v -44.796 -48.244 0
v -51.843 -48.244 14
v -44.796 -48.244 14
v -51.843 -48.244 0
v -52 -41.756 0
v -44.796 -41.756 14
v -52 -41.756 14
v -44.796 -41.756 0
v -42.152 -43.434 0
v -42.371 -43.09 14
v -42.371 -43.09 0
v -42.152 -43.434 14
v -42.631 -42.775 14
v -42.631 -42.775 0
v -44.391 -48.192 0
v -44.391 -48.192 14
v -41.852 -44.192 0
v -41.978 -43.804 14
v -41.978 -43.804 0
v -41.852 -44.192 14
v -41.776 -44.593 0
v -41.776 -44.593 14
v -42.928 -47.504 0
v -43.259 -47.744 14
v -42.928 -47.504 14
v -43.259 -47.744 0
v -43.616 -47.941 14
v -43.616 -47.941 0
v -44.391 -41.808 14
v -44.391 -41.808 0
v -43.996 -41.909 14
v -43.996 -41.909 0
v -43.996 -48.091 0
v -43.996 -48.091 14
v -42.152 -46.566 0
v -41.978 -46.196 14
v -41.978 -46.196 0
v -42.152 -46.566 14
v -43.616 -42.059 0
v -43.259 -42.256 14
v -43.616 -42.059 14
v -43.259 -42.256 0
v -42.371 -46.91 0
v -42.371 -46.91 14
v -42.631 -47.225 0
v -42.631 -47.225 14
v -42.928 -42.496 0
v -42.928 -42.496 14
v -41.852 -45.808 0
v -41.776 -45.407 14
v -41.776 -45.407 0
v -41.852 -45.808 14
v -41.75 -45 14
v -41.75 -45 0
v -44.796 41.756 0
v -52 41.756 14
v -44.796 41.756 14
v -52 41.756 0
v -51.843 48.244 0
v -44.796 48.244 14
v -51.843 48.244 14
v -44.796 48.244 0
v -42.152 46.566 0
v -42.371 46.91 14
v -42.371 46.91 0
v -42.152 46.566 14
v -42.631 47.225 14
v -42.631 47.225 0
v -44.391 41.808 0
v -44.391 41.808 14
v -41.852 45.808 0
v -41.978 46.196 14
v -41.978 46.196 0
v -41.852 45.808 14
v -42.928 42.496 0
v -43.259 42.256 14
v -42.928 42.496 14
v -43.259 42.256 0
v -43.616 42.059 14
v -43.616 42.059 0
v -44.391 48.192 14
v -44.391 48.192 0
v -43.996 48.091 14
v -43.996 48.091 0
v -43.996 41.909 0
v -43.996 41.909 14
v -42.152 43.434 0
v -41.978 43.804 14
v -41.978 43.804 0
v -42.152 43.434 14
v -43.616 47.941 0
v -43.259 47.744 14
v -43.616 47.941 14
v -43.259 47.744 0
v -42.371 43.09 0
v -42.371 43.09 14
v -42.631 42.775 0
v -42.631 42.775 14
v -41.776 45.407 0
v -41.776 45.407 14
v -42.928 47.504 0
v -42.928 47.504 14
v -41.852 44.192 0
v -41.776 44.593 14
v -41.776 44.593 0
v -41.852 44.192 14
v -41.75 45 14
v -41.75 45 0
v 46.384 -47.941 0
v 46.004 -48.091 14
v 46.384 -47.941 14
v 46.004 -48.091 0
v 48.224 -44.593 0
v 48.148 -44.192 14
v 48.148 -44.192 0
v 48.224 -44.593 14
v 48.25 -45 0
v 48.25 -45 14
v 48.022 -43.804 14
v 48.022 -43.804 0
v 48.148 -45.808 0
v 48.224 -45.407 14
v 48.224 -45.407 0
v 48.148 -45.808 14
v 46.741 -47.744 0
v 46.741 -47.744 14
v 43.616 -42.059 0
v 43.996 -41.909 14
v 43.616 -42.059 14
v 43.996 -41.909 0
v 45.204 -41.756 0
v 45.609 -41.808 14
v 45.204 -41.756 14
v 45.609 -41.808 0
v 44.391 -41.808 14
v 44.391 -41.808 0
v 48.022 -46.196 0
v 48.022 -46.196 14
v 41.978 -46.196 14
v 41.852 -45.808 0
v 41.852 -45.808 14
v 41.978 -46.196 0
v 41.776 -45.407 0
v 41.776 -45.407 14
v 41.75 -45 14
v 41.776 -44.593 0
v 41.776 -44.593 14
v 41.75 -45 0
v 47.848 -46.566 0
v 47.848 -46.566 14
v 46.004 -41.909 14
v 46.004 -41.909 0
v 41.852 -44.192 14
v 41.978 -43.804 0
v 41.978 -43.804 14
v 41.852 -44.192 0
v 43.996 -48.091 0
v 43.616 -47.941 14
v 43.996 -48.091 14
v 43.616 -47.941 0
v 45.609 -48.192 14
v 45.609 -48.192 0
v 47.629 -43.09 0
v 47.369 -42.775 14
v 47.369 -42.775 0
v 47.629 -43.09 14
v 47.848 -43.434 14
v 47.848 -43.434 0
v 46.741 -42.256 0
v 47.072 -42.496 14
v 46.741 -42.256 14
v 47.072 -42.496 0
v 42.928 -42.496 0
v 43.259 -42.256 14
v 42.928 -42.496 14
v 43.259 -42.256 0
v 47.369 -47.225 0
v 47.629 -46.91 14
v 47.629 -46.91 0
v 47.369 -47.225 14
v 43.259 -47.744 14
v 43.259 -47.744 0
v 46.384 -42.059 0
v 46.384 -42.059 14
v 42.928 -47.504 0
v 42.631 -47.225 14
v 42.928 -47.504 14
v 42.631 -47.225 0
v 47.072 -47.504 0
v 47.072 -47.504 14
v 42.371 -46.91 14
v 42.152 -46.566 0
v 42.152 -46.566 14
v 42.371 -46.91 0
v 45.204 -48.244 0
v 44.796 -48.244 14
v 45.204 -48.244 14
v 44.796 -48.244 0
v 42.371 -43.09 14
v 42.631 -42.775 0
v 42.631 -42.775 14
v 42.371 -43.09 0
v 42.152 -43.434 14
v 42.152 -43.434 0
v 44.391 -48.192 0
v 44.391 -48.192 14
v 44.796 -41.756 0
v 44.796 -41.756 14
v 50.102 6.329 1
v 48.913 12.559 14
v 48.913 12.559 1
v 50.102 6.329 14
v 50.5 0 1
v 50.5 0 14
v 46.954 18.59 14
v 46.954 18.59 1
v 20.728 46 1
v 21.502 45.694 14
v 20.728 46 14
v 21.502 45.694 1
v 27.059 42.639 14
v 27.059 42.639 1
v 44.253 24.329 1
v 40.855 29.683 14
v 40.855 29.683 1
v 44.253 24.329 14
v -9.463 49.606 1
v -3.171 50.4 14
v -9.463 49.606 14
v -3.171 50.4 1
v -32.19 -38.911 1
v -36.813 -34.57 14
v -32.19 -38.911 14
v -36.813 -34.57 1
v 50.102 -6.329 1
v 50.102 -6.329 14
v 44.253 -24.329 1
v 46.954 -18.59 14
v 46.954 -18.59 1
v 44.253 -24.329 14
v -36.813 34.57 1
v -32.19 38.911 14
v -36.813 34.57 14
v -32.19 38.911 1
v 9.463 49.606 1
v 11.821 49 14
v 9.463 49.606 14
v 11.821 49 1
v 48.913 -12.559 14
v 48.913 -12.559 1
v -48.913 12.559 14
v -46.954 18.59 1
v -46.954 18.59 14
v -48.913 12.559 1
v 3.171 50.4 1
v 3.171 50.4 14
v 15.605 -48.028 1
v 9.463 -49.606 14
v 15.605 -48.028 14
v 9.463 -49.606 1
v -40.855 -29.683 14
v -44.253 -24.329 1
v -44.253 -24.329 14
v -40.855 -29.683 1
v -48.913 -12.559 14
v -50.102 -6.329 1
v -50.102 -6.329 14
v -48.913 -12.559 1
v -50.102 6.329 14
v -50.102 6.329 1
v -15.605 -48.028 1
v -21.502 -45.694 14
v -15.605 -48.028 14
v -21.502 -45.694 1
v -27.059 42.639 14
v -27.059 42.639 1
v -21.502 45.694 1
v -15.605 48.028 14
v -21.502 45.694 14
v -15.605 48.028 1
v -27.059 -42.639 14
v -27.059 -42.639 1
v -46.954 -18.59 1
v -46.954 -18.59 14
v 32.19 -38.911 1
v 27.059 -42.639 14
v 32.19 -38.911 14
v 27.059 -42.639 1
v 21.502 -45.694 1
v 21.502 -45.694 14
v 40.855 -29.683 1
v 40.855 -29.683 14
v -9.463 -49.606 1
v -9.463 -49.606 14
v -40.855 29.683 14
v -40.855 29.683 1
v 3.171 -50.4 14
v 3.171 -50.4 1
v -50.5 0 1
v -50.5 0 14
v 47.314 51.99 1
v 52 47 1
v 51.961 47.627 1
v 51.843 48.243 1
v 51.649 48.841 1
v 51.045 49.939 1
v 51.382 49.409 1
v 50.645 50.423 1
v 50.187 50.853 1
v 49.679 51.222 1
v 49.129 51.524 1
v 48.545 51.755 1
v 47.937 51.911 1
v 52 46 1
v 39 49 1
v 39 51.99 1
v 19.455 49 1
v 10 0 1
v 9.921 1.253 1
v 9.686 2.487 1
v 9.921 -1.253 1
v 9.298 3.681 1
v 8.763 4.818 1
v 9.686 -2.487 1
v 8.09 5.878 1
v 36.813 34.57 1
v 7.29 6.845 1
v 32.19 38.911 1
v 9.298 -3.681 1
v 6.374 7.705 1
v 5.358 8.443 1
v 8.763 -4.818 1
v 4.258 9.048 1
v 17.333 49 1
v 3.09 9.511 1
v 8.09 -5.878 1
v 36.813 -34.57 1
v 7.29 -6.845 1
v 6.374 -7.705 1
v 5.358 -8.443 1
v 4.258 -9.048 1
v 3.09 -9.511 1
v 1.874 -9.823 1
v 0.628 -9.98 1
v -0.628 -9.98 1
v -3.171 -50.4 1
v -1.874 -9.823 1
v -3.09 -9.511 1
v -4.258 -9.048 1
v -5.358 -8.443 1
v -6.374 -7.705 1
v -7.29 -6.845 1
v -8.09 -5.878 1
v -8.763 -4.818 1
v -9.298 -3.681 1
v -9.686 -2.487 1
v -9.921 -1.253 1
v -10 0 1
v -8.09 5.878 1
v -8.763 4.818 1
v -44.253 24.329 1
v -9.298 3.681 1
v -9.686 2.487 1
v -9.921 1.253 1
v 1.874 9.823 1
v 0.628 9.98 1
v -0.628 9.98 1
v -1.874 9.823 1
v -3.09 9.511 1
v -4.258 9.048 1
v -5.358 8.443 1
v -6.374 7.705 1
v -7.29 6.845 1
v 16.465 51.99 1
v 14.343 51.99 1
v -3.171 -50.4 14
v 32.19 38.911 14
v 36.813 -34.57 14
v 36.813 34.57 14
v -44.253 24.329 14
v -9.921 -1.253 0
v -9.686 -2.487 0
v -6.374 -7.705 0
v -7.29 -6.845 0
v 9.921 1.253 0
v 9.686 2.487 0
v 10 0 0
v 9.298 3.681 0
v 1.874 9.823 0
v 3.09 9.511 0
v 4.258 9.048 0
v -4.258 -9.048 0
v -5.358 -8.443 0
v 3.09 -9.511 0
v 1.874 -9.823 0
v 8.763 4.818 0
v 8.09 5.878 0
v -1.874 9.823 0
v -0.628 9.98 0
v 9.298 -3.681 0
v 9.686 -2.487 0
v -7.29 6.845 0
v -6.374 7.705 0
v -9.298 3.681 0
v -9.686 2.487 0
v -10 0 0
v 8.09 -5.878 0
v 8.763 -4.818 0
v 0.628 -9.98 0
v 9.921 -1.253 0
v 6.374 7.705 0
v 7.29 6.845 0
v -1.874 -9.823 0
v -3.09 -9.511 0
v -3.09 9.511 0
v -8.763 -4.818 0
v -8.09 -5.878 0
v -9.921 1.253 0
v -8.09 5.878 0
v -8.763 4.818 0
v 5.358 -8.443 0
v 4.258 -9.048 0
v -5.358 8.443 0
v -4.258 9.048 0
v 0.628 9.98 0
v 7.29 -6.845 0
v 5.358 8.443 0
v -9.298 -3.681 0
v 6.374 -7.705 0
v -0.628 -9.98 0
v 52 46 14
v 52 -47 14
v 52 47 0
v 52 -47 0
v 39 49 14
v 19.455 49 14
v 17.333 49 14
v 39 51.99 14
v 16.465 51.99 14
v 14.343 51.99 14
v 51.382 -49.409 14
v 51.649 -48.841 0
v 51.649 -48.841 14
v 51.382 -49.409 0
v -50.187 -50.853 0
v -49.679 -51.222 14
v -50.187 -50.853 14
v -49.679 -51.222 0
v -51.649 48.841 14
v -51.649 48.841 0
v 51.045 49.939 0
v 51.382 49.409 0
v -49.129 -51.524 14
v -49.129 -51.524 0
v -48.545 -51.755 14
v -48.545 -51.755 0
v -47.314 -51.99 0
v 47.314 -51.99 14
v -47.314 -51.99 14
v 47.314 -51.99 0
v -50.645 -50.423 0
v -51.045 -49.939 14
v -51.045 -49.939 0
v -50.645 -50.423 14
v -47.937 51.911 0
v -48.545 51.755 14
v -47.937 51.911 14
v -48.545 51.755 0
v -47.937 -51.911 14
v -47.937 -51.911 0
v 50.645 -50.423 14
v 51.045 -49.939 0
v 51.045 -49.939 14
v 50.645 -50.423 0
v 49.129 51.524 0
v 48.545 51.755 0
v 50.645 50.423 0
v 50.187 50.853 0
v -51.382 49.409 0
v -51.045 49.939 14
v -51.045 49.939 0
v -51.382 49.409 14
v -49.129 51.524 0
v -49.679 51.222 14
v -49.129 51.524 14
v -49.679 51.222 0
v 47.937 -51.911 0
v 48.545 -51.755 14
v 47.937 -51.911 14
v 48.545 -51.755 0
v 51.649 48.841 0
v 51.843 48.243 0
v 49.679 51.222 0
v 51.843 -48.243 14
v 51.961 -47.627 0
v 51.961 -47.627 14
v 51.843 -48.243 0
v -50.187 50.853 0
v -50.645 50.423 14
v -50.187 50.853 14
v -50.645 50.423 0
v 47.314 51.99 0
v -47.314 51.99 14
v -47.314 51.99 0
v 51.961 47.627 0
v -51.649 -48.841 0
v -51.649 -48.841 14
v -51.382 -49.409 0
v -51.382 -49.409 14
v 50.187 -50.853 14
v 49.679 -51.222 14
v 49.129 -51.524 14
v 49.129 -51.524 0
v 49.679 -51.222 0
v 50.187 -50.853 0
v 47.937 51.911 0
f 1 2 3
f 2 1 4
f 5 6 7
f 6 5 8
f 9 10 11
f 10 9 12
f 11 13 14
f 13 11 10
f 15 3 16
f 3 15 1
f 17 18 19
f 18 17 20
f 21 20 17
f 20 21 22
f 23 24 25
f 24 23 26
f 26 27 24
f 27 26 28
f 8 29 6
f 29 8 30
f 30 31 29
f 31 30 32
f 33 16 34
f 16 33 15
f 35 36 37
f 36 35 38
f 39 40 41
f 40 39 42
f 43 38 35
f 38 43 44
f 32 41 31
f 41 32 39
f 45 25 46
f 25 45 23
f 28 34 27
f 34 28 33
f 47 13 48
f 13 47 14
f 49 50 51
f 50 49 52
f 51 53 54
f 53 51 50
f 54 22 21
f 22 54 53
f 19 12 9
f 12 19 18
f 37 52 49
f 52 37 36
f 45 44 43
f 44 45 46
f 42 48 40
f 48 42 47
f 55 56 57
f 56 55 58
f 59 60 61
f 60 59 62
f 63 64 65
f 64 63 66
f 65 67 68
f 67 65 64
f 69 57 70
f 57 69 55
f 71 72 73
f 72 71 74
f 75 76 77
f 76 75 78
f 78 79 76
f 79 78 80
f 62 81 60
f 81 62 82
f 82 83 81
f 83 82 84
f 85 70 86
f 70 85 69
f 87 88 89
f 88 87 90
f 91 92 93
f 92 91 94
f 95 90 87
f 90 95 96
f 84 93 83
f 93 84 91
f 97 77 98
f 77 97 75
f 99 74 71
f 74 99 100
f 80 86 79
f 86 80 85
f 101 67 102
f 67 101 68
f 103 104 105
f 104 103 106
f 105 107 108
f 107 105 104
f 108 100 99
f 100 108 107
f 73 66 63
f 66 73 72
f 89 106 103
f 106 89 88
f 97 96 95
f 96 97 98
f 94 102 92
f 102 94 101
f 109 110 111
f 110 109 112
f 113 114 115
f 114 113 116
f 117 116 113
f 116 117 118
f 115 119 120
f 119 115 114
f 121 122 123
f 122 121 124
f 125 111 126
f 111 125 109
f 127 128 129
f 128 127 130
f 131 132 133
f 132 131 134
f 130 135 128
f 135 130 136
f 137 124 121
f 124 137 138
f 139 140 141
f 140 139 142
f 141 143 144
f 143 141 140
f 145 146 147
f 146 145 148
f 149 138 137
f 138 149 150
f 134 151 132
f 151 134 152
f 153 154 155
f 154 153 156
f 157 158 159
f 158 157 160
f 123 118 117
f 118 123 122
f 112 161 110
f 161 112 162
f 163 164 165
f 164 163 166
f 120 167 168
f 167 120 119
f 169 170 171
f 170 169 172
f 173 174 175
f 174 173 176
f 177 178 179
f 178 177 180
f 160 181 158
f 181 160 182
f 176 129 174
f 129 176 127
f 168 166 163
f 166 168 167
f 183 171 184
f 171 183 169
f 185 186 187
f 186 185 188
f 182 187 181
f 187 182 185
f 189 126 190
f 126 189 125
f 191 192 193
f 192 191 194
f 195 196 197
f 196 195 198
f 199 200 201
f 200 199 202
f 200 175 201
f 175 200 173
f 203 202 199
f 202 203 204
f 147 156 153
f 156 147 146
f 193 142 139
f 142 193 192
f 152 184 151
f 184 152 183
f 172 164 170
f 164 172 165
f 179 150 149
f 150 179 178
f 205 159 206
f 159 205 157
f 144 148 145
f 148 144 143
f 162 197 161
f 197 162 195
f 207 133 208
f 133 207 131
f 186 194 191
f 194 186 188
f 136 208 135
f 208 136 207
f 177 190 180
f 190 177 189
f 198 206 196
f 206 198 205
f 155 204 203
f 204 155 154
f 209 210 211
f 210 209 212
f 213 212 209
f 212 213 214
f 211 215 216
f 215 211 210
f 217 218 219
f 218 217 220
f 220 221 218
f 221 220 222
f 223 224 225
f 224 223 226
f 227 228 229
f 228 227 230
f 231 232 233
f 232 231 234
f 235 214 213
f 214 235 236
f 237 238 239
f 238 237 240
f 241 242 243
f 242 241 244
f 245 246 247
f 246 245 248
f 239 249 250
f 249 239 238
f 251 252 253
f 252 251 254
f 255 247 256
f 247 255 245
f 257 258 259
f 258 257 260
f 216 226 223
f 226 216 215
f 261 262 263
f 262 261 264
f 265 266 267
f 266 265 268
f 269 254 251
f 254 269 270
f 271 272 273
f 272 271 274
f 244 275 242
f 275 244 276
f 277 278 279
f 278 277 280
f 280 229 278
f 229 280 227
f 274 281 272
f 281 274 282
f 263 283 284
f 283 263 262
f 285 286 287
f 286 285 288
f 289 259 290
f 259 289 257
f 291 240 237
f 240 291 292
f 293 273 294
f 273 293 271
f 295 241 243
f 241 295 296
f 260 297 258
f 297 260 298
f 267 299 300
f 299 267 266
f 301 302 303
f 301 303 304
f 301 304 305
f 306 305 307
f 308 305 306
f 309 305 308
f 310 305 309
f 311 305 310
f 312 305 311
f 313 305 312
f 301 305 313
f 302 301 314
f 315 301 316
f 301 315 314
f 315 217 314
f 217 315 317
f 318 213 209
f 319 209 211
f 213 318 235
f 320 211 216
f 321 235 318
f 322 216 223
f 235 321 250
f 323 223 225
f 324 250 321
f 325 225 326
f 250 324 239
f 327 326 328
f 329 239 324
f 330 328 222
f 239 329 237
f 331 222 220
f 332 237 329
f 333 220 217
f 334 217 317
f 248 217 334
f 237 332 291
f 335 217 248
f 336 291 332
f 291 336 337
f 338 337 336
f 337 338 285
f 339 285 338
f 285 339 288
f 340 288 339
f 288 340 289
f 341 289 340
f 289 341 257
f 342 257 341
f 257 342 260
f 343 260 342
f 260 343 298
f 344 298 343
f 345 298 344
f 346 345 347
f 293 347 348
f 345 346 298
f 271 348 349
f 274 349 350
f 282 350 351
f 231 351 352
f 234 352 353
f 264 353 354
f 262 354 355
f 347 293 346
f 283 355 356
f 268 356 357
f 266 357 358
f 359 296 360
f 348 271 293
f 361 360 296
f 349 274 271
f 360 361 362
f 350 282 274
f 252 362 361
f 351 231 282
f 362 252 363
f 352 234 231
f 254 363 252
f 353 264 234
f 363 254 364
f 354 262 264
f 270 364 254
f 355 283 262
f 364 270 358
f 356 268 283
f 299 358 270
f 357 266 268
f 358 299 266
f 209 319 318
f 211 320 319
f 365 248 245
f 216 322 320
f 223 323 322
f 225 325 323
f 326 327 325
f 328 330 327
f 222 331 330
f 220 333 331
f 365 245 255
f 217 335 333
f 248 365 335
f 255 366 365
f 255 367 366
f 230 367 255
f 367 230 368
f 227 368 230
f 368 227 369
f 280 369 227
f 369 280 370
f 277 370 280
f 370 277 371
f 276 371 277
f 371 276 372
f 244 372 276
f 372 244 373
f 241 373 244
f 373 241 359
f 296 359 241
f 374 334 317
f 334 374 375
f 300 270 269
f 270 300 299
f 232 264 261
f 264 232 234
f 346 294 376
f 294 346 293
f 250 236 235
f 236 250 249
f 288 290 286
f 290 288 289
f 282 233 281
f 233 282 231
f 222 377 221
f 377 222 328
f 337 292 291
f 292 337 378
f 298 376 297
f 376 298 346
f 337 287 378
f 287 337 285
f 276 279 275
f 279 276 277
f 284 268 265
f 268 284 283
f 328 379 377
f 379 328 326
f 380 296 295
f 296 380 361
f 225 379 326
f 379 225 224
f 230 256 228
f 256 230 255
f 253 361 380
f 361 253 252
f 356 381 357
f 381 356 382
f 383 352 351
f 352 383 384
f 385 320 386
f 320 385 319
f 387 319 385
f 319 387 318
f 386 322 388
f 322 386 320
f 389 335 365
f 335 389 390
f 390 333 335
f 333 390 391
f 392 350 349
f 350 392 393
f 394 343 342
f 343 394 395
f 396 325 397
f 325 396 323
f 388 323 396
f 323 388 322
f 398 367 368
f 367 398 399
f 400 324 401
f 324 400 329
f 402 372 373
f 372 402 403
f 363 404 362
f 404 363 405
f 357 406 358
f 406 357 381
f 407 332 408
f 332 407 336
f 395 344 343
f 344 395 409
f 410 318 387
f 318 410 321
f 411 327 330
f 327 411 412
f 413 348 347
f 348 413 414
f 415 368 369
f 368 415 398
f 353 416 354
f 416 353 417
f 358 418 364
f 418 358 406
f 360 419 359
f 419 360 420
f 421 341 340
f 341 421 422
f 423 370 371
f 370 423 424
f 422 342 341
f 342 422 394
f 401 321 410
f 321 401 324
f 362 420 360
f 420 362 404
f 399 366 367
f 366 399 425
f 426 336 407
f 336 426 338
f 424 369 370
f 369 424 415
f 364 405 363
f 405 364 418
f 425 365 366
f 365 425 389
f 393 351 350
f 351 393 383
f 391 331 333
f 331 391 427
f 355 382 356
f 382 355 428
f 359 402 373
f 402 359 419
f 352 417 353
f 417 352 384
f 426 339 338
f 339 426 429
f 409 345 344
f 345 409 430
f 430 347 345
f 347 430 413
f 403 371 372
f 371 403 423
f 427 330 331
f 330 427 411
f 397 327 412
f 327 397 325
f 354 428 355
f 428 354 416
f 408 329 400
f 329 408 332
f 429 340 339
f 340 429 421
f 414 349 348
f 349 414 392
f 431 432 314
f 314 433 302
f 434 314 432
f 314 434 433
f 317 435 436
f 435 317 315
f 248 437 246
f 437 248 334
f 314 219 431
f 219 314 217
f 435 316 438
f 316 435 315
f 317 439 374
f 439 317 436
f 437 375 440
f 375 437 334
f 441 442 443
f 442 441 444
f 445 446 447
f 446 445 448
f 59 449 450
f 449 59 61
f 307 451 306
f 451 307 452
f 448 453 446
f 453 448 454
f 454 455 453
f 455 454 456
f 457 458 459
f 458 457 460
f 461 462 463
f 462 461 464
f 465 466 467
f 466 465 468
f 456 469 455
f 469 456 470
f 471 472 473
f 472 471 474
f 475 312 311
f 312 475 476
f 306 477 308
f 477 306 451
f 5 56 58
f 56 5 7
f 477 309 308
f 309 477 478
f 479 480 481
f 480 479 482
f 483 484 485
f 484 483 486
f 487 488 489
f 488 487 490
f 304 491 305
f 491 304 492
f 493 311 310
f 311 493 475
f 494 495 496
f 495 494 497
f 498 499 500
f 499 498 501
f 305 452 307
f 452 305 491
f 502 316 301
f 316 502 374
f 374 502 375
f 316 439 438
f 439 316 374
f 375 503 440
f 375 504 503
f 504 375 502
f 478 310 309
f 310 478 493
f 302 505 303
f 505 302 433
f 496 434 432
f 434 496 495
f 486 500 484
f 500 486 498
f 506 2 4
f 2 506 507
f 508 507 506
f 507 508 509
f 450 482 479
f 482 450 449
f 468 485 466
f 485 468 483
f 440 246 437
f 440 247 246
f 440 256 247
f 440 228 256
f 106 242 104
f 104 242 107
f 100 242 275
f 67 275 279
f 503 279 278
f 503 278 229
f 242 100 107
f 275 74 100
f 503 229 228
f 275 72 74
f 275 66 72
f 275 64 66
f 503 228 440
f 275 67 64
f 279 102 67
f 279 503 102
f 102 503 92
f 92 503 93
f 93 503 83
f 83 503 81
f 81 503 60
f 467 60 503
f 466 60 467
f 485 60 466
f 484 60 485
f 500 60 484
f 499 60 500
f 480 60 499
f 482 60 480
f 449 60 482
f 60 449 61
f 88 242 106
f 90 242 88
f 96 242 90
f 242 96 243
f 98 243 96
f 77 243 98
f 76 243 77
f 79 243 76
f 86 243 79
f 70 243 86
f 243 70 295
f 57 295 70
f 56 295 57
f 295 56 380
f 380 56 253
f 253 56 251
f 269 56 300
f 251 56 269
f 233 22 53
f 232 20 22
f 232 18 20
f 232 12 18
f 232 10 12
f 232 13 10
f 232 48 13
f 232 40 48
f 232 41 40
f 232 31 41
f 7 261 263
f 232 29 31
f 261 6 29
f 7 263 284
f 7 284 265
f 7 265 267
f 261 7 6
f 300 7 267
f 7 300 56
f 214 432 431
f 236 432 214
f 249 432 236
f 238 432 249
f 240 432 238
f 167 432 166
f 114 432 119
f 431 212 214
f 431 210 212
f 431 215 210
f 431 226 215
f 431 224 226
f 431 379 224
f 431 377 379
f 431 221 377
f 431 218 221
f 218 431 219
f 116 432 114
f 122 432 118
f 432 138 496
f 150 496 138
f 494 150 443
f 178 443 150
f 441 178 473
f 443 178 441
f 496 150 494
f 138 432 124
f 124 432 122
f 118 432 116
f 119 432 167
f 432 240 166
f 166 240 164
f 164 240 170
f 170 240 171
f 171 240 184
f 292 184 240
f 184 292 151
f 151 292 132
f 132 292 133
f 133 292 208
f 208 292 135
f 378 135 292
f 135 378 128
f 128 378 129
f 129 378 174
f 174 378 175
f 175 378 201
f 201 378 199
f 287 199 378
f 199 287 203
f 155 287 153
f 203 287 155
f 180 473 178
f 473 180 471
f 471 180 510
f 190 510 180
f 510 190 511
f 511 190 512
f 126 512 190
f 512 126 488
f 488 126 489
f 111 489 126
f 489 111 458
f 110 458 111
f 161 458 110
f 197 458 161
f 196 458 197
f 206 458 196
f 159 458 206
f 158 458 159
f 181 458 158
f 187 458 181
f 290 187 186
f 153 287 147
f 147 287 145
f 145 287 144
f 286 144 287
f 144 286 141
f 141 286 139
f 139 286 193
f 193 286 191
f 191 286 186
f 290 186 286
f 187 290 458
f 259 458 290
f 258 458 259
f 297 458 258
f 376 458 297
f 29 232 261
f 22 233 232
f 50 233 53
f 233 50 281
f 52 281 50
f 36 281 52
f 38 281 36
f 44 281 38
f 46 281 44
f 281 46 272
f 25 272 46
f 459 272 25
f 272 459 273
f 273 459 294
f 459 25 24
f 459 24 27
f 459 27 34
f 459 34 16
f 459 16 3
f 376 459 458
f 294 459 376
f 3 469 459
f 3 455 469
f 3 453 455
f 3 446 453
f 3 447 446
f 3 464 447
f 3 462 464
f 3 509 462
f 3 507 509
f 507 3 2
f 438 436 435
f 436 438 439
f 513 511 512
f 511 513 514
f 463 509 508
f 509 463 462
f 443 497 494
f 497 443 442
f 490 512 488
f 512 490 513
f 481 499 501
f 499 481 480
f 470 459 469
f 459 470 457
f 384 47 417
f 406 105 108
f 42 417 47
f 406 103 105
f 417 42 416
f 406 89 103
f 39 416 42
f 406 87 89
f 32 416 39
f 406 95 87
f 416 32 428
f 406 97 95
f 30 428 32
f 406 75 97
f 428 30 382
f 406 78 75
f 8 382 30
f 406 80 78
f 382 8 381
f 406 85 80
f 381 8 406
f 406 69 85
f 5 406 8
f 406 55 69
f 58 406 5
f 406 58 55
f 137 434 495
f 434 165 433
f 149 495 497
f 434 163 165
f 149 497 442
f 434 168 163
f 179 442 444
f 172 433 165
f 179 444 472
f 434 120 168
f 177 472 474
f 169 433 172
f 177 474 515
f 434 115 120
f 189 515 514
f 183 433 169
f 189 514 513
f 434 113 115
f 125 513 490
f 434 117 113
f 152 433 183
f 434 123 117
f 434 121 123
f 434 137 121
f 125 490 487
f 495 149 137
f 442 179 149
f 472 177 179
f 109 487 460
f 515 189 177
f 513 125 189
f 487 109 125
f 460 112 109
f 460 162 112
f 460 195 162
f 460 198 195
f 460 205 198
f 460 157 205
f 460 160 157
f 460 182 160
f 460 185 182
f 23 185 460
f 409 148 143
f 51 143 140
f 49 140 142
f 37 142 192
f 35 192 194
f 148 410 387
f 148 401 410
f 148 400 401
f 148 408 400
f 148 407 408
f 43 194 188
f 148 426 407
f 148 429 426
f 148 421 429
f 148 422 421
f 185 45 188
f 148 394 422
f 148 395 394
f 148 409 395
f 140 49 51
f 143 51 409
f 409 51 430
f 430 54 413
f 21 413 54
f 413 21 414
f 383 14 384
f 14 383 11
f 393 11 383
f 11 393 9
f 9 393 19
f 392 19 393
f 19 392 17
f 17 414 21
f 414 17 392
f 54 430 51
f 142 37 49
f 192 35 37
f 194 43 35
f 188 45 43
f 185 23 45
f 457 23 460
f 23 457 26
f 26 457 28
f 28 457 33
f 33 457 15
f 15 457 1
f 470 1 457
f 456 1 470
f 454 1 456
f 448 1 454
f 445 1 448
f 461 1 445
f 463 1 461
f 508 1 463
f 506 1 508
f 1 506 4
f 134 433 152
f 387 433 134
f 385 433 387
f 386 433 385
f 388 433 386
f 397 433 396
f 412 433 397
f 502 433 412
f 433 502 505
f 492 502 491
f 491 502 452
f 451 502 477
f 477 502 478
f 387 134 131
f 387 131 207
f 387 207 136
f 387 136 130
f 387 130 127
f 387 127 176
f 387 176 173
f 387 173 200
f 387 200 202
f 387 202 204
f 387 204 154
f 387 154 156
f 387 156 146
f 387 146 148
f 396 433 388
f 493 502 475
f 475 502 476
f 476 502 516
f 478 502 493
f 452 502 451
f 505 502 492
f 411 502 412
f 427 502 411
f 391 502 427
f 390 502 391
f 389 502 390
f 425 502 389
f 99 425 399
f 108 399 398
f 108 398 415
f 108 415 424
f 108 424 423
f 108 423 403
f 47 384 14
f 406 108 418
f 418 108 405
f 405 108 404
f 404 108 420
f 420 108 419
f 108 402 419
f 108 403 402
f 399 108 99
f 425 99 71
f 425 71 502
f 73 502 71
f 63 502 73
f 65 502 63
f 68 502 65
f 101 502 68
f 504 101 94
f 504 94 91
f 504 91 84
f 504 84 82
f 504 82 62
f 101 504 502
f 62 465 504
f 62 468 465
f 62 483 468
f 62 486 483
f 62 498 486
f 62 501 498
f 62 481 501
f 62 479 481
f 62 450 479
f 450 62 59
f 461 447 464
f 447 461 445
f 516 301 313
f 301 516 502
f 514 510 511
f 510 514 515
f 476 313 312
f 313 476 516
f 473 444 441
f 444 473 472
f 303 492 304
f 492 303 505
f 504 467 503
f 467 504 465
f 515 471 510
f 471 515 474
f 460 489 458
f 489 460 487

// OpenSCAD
$fn = 50;


difference() {
	union() {
		translate(v = [0, 0, 0]) {
			rotate(a = [0, 0, 0]) {
				hull() {
					translate(v = [-47.0000000000, 47.0000000000, 0]) {
						rotate(a = [0, 0, 0]) {
							translate(v = [0, 0, 0]) {
								rotate(a = [0, 0, 0]) {
									cylinder(h = 14, r = 5);
								}
							}
						}
					}
					translate(v = [47.0000000000, 47.0000000000, 0]) {
						rotate(a = [0, 0, 0]) {
							translate(v = [0, 0, 0]) {
								rotate(a = [0, 0, 0]) {
									cylinder(h = 14, r = 5);
								}
							}
						}
					}
					translate(v = [-47.0000000000, -47.0000000000, 0]) {
						rotate(a = [0, 0, 0]) {
							translate(v = [0, 0, 0]) {
								rotate(a = [0, 0, 0]) {
									cylinder(h = 14, r = 5);
								}
							}
						}
					}
					translate(v = [47.0000000000, -47.0000000000, 0]) {
						rotate(a = [0, 0, 0]) {
							translate(v = [0, 0, 0]) {
								rotate(a = [0, 0, 0]) {
									cylinder(h = 14, r = 5);
								}
							}
						}
					}
				}
			}
		}
	}
	union() {
		translate(v = [-52.5000000000, -45.0000000000, -125]) {
			rotate(a = [0, 0, 0]) {
				hull() {
					translate(v = [7.5000000000, 0, 0]) {
						rotate(a = [0, 0, 0]) {
							translate(v = [0, 0, 0]) {
								rotate(a = [0, 0, 0]) {
									cylinder(h = 250, r = 3.2500000000);
								}
							}
						}
					}
					translate(v = [-7.5000000000, 0, 0]) {
						rotate(a = [0, 0, 0]) {
							translate(v = [0, 0, 0]) {
								rotate(a = [0, 0, 0]) {
									cylinder(h = 250, r = 3.2500000000);
								}
							}
						}
					}
				}
			}
		}
		translate(v = [-52.5000000000, 45.0000000000, -125]) {
			rotate(a = [0, 0, 0]) {
				hull() {
					translate(v = [7.5000000000, 0, 0]) {
						rotate(a = [0, 0, 0]) {
							translate(v = [0, 0, 0]) {
								rotate(a = [0, 0, 0]) {
									cylinder(h = 250, r = 3.2500000000);
								}
							}
						}
					}
					translate(v = [-7.5000000000, 0, 0]) {
						rotate(a = [0, 0, 0]) {
							translate(v = [0, 0, 0]) {
								rotate(a = [0, 0, 0]) {
									cylinder(h = 250, r = 3.2500000000);
								}
							}
						}
					}
				}
			}
		}
		translate(v = [45.0000000000, -45.0000000000, -125.0000000000]) {
			rotate(a = [0, 0, 0]) {
				cylinder(h = 250, r = 3.2500000000);
			}
		}
		translate(v = [0, 0, 1.0000000000]) {
			rotate(a = [0, 0, 0]) {
				cylinder(h = 16, r = 50.5000000000);
			}
		}
		translate(v = [0, 0, -7.0000000000]) {
			rotate(a = [0, 0, 0]) {
				cylinder(h = 14, r = 10.0000000000);
			}
		}
		translate(v = [0.0000000000, 46.0000000000, 1]) {
			rotate(a = [0, 0, 0]) {
				cube(size = [52.0000000000, 3, 16]);
			}
		}
		translate(v = [39.0000000000, 46.0000000000, 1]) {
			rotate(a = [0, 0, 0]) {
				cube(size = [13.0000000000, 6, 16]);
			}
		}
		translate(v = [13.5833333333, 52.7500000000, 1]) {
			rotate(a = [0, 0, -45]) {
				cube(size = [7.5000000000, 1.5000000000, 16]);
			}
		}
	}
}
